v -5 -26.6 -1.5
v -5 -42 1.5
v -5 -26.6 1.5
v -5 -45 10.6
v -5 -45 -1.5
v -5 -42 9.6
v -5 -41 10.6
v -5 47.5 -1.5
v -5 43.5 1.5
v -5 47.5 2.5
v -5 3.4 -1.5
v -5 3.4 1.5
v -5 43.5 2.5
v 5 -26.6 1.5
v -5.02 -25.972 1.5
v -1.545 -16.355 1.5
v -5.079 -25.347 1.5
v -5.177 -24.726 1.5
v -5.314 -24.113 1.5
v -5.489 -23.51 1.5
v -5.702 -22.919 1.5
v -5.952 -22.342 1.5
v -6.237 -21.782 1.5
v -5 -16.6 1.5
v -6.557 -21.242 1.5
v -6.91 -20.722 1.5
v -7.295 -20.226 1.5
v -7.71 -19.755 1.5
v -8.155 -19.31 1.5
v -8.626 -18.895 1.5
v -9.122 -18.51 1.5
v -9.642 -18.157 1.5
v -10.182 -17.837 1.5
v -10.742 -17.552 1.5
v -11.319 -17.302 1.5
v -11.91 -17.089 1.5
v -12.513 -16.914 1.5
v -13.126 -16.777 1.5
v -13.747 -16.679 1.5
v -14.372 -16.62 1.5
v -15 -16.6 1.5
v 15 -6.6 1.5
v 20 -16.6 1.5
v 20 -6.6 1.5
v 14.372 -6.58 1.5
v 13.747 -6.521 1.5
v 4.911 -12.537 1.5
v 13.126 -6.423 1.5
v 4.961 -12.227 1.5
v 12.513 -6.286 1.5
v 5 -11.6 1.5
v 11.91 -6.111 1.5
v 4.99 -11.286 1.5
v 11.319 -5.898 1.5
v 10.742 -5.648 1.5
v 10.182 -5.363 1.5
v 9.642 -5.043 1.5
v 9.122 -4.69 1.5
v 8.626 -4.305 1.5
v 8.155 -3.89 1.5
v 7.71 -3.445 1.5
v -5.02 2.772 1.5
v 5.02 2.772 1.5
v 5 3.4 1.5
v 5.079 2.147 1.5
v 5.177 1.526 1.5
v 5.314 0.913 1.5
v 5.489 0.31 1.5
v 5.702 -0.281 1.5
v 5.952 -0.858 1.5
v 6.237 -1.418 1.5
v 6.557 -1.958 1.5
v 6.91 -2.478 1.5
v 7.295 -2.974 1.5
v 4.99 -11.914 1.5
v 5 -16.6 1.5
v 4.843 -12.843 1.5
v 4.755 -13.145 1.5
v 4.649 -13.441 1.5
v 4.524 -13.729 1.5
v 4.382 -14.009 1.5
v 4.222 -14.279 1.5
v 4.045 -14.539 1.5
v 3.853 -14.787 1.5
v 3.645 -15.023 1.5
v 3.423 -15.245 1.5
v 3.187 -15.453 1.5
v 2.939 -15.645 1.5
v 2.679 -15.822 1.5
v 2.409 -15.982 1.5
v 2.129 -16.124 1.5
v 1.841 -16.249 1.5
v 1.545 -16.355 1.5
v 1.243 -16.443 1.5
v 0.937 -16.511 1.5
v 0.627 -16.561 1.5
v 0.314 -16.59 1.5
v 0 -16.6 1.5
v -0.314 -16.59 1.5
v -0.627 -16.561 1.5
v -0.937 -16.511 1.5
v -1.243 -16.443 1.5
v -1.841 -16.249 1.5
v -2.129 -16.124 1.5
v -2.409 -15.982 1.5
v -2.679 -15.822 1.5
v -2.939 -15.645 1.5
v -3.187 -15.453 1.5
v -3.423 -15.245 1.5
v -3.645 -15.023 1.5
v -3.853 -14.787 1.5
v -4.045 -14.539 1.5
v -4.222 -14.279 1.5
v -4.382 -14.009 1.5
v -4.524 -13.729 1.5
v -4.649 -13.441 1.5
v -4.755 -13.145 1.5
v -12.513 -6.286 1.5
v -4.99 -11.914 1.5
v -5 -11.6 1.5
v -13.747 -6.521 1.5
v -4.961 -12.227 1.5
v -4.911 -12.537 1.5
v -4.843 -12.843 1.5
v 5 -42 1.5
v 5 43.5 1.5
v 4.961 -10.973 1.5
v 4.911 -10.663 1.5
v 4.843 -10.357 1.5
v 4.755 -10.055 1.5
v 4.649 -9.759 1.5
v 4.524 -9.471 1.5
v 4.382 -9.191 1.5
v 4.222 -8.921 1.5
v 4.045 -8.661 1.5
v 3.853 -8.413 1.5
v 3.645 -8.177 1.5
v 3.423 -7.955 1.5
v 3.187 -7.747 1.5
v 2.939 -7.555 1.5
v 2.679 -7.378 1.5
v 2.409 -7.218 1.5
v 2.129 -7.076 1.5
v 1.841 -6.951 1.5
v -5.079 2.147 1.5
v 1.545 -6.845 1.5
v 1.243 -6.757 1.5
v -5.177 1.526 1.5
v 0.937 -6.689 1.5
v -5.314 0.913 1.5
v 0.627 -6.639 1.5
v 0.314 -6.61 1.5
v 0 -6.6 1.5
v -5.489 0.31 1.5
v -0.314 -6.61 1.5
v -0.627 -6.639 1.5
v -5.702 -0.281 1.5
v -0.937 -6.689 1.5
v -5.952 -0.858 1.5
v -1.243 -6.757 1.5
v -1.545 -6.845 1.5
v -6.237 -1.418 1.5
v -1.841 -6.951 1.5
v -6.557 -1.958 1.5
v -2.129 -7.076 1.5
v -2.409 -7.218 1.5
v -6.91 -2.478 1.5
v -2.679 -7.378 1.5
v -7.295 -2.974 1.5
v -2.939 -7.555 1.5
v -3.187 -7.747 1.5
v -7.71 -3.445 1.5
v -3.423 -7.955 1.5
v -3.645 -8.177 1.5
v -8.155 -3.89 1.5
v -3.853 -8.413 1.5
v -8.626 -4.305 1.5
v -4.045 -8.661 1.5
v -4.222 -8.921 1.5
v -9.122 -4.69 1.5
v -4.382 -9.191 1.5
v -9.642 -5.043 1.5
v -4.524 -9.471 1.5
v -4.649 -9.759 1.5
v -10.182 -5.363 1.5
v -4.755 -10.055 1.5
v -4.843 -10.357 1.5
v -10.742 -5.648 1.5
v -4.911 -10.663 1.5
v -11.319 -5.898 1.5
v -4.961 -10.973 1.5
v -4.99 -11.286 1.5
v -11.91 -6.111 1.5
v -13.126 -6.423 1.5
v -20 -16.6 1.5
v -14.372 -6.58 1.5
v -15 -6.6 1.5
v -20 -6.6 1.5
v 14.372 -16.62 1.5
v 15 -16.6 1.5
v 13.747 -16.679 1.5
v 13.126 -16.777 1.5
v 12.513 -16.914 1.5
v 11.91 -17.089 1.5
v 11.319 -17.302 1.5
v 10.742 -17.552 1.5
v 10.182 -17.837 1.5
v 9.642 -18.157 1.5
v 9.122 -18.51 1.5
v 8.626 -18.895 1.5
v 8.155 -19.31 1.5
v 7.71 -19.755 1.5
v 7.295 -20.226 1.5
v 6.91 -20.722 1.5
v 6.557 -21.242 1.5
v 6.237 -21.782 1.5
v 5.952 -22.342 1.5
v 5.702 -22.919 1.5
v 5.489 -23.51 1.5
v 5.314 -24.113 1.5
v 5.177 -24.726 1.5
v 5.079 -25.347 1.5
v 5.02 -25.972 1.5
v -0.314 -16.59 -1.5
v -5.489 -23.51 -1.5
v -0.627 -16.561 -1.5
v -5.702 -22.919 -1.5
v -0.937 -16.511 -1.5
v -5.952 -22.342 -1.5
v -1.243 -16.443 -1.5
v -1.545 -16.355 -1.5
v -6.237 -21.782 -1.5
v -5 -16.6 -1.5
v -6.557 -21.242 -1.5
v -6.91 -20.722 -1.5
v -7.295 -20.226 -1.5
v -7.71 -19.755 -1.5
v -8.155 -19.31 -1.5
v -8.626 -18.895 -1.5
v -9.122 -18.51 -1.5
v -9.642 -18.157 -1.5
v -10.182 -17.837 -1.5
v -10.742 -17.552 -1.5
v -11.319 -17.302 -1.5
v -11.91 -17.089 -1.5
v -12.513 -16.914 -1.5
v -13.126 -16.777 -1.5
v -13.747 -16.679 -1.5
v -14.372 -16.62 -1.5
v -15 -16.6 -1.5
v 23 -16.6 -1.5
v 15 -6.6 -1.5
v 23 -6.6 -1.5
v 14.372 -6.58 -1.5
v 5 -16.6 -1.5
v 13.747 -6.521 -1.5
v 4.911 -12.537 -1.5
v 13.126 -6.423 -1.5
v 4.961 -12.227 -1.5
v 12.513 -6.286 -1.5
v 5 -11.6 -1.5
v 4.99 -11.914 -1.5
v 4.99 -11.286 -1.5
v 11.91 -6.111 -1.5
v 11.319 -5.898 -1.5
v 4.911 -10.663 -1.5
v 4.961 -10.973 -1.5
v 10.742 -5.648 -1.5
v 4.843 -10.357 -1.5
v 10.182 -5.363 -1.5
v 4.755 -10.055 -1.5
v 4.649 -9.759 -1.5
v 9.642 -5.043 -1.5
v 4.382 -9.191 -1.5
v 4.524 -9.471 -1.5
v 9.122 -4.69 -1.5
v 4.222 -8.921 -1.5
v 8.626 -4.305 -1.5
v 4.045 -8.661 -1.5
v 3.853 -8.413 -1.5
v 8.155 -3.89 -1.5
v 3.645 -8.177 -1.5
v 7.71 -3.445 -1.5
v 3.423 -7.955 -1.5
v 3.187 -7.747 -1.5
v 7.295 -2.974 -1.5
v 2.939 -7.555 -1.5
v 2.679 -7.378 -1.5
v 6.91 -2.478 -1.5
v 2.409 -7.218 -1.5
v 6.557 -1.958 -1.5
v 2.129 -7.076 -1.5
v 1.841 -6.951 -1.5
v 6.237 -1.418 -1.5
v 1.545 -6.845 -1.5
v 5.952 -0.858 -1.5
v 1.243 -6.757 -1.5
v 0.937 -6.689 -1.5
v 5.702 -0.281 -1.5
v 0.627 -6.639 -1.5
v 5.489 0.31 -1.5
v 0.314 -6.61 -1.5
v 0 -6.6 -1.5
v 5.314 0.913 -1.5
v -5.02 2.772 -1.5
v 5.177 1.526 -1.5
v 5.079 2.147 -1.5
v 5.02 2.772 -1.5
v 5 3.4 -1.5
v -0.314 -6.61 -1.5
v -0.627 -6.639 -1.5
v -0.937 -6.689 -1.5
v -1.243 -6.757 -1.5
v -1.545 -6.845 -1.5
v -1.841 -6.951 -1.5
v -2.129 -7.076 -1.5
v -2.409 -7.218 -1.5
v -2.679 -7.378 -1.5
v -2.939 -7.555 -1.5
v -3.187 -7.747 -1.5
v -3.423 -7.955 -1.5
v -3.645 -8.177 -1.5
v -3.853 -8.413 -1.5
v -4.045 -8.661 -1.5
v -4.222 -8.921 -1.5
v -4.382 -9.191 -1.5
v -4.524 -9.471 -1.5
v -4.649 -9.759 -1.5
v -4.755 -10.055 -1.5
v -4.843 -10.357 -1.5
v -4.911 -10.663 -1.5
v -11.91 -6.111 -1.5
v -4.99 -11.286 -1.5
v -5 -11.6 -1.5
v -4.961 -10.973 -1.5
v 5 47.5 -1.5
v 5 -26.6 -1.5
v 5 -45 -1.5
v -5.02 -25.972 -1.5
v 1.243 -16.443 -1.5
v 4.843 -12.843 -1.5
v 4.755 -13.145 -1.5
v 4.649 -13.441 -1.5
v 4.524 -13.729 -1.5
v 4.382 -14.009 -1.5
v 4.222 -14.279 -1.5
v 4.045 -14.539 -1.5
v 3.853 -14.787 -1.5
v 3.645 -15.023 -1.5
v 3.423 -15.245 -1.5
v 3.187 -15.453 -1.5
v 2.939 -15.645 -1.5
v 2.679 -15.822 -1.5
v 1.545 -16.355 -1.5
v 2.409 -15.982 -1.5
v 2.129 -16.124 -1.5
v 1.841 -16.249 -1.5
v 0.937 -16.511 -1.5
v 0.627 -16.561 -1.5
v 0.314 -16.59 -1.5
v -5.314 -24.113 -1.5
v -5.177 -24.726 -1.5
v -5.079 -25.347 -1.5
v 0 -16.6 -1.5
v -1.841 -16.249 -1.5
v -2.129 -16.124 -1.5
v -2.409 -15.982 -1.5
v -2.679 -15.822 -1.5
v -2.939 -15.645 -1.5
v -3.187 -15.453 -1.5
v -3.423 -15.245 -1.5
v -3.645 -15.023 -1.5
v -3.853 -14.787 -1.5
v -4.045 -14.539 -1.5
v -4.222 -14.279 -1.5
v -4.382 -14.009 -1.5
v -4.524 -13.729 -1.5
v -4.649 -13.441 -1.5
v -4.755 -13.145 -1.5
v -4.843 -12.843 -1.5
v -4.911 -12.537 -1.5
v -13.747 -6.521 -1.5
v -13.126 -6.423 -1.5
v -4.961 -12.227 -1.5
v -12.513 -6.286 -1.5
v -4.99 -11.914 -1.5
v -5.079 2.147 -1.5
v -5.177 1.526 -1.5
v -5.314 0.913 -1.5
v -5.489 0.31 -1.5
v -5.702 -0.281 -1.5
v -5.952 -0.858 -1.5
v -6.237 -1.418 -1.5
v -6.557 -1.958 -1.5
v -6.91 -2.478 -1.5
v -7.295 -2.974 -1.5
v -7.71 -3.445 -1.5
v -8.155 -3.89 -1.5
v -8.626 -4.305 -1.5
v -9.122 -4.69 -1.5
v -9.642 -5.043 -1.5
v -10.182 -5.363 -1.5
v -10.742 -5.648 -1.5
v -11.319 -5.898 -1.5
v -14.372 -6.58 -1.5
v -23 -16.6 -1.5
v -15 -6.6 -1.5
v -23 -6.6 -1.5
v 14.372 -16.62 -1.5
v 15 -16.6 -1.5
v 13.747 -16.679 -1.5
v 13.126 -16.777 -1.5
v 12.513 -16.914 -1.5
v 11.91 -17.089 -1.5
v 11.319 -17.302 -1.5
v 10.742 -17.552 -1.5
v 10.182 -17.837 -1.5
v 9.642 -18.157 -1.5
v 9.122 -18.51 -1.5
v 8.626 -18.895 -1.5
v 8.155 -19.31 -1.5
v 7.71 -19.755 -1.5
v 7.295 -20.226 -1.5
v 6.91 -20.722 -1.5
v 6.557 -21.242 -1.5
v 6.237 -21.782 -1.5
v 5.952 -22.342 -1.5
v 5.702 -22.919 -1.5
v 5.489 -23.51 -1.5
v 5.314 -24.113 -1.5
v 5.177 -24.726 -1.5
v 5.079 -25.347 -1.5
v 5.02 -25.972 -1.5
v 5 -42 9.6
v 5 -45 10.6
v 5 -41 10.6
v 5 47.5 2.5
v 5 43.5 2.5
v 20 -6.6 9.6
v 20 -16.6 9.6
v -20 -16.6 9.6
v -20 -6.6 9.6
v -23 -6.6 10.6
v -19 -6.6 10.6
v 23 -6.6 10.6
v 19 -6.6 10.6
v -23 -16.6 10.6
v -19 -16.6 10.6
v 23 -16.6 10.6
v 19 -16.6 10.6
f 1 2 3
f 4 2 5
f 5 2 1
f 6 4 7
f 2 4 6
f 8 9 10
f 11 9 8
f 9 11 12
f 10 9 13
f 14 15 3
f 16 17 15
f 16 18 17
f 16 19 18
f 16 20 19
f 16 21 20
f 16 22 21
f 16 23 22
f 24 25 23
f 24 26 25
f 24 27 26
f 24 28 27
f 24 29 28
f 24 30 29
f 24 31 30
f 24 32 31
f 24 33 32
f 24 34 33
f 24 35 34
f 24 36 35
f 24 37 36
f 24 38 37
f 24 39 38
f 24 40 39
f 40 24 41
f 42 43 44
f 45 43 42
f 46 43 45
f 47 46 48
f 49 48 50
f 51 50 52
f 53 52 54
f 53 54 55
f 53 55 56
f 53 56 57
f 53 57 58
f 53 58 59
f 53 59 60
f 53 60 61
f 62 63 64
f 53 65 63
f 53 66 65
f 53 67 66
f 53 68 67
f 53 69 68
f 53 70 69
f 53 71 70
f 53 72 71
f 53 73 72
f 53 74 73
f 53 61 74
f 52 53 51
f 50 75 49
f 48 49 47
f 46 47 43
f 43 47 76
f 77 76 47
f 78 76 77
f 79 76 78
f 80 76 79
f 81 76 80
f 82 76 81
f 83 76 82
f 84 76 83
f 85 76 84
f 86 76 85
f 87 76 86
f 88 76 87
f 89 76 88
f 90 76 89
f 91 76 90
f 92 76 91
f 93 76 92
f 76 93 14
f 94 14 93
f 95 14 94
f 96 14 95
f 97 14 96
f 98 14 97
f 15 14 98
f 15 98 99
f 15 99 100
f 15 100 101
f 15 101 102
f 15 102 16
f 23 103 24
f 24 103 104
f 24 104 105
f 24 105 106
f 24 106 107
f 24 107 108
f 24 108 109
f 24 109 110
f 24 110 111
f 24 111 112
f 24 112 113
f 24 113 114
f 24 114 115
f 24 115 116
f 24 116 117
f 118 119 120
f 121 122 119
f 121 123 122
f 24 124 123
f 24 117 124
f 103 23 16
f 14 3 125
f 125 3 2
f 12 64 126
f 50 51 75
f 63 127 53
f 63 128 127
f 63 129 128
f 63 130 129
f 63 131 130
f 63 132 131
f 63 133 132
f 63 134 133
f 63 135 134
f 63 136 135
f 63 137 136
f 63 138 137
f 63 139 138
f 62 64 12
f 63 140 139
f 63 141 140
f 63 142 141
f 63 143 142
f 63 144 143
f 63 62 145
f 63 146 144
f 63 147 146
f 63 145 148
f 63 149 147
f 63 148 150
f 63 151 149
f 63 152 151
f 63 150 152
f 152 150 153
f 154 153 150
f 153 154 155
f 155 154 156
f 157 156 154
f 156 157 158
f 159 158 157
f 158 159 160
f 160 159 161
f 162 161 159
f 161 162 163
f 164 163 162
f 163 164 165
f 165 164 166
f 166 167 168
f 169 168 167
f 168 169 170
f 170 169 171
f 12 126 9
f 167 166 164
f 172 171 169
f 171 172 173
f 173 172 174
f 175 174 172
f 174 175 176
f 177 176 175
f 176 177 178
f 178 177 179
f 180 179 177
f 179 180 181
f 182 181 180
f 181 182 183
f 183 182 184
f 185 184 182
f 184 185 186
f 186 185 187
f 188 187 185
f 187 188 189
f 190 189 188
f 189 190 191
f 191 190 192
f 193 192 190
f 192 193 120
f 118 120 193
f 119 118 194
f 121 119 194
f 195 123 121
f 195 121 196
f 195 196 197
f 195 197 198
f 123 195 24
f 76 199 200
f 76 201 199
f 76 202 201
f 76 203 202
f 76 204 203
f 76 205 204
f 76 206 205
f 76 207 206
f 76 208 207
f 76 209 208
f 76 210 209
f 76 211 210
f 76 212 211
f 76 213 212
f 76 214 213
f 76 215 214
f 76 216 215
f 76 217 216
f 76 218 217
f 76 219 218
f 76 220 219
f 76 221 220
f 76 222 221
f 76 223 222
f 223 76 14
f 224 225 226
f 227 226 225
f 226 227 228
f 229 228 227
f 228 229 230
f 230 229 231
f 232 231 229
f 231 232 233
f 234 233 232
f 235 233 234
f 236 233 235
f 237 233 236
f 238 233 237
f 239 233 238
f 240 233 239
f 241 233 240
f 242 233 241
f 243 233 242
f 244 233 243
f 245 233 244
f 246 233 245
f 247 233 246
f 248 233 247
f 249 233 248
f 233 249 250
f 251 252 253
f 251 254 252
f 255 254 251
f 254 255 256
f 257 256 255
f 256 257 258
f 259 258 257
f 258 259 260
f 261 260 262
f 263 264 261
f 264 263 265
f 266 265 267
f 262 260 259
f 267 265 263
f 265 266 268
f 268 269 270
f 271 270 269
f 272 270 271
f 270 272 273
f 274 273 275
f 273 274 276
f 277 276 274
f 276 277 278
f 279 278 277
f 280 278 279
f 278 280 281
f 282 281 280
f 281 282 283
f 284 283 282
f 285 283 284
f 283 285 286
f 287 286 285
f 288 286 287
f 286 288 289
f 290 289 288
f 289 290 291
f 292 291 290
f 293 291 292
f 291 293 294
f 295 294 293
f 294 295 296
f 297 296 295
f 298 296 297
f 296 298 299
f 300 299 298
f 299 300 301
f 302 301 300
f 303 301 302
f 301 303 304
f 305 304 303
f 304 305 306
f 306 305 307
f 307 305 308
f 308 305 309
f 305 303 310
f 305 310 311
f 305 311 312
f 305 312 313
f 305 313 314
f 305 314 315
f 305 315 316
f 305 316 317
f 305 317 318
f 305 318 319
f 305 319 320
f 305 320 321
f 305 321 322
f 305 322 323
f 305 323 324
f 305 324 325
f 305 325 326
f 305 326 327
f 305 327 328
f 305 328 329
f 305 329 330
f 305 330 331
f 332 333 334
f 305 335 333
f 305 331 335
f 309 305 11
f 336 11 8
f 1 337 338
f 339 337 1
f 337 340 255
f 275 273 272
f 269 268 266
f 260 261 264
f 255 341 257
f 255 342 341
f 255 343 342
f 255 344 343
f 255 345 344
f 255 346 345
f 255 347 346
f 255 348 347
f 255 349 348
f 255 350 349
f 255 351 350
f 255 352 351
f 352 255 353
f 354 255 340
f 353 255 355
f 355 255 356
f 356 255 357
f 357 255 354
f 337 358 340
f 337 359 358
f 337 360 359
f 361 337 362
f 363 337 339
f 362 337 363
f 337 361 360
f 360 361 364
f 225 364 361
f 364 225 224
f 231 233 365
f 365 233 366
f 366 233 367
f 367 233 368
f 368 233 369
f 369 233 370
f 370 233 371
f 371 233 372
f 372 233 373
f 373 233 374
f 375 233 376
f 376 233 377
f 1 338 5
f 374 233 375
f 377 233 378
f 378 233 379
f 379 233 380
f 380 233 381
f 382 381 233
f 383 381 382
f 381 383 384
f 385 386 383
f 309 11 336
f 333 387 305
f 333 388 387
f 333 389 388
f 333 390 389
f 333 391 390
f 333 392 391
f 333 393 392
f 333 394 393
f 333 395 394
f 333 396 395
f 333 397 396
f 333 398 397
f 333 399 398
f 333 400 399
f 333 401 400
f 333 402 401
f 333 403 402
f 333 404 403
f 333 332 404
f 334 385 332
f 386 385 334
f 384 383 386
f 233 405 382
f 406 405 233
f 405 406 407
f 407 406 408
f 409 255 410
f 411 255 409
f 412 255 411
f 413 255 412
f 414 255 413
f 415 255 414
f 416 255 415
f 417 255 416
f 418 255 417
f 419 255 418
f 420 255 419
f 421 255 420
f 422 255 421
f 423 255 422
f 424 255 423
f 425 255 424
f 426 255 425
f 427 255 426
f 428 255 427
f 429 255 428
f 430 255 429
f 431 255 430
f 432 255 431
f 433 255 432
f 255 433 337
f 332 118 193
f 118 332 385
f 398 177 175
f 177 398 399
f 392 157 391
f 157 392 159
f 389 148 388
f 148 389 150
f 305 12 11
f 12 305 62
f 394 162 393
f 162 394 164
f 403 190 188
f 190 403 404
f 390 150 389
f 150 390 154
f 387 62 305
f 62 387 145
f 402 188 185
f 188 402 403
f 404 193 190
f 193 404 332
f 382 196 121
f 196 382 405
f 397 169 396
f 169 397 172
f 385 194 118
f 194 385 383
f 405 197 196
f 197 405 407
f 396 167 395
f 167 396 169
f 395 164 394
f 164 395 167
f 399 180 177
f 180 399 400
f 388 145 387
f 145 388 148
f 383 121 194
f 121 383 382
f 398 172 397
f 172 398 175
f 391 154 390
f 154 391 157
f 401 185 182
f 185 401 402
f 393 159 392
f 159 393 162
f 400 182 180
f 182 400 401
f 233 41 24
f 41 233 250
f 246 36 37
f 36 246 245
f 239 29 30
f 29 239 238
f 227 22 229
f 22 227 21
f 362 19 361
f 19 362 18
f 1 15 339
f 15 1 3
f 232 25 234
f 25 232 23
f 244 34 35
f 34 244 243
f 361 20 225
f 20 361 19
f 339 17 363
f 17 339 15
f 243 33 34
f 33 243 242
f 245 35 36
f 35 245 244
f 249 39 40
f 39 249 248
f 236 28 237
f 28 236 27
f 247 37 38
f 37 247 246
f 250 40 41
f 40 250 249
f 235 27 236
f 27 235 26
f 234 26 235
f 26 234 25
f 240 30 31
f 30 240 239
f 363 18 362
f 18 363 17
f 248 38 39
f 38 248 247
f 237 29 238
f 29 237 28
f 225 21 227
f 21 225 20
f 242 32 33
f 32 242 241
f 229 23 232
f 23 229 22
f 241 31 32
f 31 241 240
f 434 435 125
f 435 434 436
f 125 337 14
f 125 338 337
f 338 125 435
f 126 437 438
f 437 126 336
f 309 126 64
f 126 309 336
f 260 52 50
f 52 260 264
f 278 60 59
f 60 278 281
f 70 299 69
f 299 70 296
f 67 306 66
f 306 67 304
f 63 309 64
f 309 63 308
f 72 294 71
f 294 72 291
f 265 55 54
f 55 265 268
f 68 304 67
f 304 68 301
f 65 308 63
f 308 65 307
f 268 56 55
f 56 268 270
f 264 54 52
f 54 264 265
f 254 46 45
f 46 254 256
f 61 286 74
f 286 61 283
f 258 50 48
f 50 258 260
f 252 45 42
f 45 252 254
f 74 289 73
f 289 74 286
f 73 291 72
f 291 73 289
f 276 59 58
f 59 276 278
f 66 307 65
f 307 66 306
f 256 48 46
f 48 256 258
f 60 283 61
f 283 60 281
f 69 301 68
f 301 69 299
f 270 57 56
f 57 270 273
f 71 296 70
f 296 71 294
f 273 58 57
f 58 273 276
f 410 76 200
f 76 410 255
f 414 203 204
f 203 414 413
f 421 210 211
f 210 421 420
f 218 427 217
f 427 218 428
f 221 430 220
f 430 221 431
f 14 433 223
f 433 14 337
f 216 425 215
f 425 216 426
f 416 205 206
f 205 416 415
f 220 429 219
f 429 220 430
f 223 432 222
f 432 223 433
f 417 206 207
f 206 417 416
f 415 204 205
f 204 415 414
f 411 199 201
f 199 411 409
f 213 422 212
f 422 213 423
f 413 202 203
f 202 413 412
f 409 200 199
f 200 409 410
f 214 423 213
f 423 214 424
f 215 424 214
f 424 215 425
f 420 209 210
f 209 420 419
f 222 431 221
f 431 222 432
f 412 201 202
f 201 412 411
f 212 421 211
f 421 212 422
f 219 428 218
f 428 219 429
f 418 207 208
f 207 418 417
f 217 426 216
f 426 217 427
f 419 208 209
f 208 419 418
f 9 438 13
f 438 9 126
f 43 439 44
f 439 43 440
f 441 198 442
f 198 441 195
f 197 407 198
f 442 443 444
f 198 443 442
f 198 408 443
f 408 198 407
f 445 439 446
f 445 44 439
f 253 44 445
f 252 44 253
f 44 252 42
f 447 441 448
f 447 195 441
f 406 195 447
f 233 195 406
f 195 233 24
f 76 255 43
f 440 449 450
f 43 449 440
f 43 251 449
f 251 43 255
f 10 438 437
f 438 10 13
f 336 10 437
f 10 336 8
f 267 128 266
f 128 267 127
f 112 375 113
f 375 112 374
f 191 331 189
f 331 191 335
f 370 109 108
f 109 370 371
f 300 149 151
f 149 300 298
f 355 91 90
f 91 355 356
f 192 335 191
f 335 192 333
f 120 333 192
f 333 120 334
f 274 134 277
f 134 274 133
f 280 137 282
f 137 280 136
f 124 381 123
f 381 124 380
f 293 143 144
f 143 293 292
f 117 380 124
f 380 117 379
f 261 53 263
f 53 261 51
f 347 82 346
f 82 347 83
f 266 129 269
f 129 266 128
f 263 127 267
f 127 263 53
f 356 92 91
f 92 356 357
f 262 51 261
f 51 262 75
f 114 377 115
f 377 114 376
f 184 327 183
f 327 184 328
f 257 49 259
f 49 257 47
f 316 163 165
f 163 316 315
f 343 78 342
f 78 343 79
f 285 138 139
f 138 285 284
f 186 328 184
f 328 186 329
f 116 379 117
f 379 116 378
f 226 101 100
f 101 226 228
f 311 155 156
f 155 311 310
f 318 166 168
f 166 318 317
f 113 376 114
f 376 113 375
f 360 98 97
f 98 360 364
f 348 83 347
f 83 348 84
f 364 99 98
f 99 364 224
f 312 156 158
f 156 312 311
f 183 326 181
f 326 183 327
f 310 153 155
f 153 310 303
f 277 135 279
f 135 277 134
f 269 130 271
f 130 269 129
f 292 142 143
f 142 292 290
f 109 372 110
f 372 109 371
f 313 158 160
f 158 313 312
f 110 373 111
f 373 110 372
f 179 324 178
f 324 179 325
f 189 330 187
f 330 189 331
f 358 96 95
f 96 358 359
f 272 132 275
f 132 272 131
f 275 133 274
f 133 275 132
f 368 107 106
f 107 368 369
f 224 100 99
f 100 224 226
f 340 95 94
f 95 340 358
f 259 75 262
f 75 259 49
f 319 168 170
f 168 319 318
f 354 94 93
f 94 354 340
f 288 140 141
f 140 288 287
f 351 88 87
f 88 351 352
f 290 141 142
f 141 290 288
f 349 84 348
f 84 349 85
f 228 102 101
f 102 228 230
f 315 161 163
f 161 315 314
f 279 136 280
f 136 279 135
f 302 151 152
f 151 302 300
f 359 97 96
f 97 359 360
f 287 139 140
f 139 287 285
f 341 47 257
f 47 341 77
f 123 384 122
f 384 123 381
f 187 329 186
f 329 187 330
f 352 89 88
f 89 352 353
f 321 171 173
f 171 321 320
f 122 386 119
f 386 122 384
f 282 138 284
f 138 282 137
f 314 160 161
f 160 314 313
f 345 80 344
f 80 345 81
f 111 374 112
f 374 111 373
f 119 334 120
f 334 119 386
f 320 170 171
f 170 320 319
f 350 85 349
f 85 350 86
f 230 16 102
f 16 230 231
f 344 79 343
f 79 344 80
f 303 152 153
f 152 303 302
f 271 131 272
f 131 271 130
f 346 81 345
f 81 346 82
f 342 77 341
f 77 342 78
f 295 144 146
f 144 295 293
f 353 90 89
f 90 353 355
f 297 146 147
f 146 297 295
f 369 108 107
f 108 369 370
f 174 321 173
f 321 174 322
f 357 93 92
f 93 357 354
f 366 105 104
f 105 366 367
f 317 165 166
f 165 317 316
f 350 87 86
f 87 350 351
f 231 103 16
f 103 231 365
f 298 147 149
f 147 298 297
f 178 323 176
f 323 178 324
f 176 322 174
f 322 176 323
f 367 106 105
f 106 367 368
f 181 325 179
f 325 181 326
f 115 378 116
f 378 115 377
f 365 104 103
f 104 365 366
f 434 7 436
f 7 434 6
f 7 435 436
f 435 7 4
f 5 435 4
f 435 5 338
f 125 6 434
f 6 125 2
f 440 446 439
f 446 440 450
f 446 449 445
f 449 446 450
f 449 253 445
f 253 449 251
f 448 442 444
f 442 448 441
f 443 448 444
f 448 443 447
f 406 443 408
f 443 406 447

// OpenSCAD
// height of remote control
height=87;

// width of remote control
width=40;

// depth of remote control
depth=7.1;

// width of clamp
clampWidth=10;

// depth of clamp plate
clampDepth=3;

// notch of clamp
clampNotch=1;

// percentage of horizontal clamp position 0 to 1
clampPosition=0.3;

// quality
$fn=100;

module enforce() {
  difference() {
    cube ([clampWidth,clampWidth,clampDepth], center=true);
    translate ([-clampWidth/2,clampWidth/2,-clampDepth/2-0.05]) cylinder (d=clampWidth*2, h=clampDepth+0.1); 
  }
}

module body() {
  difference() {
    union() {
      cube ([clampWidth,height,clampDepth], center=true);
      translate ([0,(clampPosition-0.5)*height/1.5,0]) cube ([width,clampWidth,clampDepth], center=true);
      translate ([-clampWidth,(clampPosition-0.5)*height/1.5+clampWidth,0]) enforce();
      translate ([-clampWidth,(clampPosition-0.5)*height/1.5-clampWidth,0]) rotate ([180,0,0]) enforce();
      translate ([clampWidth, (clampPosition-0.5)*height/1.5+clampWidth,0]) rotate ([0,180,0]) enforce();
      translate ([clampWidth,(clampPosition-0.5)*height/1.5-clampWidth,0]) rotate ([180,180,0]) enforce();
      translate ([0,height/2+(clampDepth+clampNotch)/2,clampNotch/2]) cube ([clampWidth,clampNotch+clampDepth,clampNotch+clampDepth], center=true);
    }
    translate ([0,(clampPosition-0.5)*height/1.5,0]) cylinder (d=clampWidth, h=clampDepth+0.1,center=true);
  }
}

module clamp() {
  translate ([-clampWidth/2,-clampDepth/2,-clampDepth/2])
  rotate ([90,0,90])
  linear_extrude (height=clampWidth)
  polygon (points=[[0,0],[clampDepth,0],[clampDepth,clampDepth+depth+clampNotch],[clampDepth+clampNotch,clampDepth+depth+clampNotch*2], [0,clampDepth+depth+clampNotch*2]]);
}

union() {
  body();
  translate ([0,-height/2,0]) clamp();
  translate ([width/2+clampDepth/2, (clampPosition-0.5)*height/1.5, 0]) rotate ([0,0,90]) clamp();
  translate ([-width/2-clampDepth/2, (clampPosition-0.5)*height/1.5, 0]) rotate ([0,0,270]) clamp();
}
